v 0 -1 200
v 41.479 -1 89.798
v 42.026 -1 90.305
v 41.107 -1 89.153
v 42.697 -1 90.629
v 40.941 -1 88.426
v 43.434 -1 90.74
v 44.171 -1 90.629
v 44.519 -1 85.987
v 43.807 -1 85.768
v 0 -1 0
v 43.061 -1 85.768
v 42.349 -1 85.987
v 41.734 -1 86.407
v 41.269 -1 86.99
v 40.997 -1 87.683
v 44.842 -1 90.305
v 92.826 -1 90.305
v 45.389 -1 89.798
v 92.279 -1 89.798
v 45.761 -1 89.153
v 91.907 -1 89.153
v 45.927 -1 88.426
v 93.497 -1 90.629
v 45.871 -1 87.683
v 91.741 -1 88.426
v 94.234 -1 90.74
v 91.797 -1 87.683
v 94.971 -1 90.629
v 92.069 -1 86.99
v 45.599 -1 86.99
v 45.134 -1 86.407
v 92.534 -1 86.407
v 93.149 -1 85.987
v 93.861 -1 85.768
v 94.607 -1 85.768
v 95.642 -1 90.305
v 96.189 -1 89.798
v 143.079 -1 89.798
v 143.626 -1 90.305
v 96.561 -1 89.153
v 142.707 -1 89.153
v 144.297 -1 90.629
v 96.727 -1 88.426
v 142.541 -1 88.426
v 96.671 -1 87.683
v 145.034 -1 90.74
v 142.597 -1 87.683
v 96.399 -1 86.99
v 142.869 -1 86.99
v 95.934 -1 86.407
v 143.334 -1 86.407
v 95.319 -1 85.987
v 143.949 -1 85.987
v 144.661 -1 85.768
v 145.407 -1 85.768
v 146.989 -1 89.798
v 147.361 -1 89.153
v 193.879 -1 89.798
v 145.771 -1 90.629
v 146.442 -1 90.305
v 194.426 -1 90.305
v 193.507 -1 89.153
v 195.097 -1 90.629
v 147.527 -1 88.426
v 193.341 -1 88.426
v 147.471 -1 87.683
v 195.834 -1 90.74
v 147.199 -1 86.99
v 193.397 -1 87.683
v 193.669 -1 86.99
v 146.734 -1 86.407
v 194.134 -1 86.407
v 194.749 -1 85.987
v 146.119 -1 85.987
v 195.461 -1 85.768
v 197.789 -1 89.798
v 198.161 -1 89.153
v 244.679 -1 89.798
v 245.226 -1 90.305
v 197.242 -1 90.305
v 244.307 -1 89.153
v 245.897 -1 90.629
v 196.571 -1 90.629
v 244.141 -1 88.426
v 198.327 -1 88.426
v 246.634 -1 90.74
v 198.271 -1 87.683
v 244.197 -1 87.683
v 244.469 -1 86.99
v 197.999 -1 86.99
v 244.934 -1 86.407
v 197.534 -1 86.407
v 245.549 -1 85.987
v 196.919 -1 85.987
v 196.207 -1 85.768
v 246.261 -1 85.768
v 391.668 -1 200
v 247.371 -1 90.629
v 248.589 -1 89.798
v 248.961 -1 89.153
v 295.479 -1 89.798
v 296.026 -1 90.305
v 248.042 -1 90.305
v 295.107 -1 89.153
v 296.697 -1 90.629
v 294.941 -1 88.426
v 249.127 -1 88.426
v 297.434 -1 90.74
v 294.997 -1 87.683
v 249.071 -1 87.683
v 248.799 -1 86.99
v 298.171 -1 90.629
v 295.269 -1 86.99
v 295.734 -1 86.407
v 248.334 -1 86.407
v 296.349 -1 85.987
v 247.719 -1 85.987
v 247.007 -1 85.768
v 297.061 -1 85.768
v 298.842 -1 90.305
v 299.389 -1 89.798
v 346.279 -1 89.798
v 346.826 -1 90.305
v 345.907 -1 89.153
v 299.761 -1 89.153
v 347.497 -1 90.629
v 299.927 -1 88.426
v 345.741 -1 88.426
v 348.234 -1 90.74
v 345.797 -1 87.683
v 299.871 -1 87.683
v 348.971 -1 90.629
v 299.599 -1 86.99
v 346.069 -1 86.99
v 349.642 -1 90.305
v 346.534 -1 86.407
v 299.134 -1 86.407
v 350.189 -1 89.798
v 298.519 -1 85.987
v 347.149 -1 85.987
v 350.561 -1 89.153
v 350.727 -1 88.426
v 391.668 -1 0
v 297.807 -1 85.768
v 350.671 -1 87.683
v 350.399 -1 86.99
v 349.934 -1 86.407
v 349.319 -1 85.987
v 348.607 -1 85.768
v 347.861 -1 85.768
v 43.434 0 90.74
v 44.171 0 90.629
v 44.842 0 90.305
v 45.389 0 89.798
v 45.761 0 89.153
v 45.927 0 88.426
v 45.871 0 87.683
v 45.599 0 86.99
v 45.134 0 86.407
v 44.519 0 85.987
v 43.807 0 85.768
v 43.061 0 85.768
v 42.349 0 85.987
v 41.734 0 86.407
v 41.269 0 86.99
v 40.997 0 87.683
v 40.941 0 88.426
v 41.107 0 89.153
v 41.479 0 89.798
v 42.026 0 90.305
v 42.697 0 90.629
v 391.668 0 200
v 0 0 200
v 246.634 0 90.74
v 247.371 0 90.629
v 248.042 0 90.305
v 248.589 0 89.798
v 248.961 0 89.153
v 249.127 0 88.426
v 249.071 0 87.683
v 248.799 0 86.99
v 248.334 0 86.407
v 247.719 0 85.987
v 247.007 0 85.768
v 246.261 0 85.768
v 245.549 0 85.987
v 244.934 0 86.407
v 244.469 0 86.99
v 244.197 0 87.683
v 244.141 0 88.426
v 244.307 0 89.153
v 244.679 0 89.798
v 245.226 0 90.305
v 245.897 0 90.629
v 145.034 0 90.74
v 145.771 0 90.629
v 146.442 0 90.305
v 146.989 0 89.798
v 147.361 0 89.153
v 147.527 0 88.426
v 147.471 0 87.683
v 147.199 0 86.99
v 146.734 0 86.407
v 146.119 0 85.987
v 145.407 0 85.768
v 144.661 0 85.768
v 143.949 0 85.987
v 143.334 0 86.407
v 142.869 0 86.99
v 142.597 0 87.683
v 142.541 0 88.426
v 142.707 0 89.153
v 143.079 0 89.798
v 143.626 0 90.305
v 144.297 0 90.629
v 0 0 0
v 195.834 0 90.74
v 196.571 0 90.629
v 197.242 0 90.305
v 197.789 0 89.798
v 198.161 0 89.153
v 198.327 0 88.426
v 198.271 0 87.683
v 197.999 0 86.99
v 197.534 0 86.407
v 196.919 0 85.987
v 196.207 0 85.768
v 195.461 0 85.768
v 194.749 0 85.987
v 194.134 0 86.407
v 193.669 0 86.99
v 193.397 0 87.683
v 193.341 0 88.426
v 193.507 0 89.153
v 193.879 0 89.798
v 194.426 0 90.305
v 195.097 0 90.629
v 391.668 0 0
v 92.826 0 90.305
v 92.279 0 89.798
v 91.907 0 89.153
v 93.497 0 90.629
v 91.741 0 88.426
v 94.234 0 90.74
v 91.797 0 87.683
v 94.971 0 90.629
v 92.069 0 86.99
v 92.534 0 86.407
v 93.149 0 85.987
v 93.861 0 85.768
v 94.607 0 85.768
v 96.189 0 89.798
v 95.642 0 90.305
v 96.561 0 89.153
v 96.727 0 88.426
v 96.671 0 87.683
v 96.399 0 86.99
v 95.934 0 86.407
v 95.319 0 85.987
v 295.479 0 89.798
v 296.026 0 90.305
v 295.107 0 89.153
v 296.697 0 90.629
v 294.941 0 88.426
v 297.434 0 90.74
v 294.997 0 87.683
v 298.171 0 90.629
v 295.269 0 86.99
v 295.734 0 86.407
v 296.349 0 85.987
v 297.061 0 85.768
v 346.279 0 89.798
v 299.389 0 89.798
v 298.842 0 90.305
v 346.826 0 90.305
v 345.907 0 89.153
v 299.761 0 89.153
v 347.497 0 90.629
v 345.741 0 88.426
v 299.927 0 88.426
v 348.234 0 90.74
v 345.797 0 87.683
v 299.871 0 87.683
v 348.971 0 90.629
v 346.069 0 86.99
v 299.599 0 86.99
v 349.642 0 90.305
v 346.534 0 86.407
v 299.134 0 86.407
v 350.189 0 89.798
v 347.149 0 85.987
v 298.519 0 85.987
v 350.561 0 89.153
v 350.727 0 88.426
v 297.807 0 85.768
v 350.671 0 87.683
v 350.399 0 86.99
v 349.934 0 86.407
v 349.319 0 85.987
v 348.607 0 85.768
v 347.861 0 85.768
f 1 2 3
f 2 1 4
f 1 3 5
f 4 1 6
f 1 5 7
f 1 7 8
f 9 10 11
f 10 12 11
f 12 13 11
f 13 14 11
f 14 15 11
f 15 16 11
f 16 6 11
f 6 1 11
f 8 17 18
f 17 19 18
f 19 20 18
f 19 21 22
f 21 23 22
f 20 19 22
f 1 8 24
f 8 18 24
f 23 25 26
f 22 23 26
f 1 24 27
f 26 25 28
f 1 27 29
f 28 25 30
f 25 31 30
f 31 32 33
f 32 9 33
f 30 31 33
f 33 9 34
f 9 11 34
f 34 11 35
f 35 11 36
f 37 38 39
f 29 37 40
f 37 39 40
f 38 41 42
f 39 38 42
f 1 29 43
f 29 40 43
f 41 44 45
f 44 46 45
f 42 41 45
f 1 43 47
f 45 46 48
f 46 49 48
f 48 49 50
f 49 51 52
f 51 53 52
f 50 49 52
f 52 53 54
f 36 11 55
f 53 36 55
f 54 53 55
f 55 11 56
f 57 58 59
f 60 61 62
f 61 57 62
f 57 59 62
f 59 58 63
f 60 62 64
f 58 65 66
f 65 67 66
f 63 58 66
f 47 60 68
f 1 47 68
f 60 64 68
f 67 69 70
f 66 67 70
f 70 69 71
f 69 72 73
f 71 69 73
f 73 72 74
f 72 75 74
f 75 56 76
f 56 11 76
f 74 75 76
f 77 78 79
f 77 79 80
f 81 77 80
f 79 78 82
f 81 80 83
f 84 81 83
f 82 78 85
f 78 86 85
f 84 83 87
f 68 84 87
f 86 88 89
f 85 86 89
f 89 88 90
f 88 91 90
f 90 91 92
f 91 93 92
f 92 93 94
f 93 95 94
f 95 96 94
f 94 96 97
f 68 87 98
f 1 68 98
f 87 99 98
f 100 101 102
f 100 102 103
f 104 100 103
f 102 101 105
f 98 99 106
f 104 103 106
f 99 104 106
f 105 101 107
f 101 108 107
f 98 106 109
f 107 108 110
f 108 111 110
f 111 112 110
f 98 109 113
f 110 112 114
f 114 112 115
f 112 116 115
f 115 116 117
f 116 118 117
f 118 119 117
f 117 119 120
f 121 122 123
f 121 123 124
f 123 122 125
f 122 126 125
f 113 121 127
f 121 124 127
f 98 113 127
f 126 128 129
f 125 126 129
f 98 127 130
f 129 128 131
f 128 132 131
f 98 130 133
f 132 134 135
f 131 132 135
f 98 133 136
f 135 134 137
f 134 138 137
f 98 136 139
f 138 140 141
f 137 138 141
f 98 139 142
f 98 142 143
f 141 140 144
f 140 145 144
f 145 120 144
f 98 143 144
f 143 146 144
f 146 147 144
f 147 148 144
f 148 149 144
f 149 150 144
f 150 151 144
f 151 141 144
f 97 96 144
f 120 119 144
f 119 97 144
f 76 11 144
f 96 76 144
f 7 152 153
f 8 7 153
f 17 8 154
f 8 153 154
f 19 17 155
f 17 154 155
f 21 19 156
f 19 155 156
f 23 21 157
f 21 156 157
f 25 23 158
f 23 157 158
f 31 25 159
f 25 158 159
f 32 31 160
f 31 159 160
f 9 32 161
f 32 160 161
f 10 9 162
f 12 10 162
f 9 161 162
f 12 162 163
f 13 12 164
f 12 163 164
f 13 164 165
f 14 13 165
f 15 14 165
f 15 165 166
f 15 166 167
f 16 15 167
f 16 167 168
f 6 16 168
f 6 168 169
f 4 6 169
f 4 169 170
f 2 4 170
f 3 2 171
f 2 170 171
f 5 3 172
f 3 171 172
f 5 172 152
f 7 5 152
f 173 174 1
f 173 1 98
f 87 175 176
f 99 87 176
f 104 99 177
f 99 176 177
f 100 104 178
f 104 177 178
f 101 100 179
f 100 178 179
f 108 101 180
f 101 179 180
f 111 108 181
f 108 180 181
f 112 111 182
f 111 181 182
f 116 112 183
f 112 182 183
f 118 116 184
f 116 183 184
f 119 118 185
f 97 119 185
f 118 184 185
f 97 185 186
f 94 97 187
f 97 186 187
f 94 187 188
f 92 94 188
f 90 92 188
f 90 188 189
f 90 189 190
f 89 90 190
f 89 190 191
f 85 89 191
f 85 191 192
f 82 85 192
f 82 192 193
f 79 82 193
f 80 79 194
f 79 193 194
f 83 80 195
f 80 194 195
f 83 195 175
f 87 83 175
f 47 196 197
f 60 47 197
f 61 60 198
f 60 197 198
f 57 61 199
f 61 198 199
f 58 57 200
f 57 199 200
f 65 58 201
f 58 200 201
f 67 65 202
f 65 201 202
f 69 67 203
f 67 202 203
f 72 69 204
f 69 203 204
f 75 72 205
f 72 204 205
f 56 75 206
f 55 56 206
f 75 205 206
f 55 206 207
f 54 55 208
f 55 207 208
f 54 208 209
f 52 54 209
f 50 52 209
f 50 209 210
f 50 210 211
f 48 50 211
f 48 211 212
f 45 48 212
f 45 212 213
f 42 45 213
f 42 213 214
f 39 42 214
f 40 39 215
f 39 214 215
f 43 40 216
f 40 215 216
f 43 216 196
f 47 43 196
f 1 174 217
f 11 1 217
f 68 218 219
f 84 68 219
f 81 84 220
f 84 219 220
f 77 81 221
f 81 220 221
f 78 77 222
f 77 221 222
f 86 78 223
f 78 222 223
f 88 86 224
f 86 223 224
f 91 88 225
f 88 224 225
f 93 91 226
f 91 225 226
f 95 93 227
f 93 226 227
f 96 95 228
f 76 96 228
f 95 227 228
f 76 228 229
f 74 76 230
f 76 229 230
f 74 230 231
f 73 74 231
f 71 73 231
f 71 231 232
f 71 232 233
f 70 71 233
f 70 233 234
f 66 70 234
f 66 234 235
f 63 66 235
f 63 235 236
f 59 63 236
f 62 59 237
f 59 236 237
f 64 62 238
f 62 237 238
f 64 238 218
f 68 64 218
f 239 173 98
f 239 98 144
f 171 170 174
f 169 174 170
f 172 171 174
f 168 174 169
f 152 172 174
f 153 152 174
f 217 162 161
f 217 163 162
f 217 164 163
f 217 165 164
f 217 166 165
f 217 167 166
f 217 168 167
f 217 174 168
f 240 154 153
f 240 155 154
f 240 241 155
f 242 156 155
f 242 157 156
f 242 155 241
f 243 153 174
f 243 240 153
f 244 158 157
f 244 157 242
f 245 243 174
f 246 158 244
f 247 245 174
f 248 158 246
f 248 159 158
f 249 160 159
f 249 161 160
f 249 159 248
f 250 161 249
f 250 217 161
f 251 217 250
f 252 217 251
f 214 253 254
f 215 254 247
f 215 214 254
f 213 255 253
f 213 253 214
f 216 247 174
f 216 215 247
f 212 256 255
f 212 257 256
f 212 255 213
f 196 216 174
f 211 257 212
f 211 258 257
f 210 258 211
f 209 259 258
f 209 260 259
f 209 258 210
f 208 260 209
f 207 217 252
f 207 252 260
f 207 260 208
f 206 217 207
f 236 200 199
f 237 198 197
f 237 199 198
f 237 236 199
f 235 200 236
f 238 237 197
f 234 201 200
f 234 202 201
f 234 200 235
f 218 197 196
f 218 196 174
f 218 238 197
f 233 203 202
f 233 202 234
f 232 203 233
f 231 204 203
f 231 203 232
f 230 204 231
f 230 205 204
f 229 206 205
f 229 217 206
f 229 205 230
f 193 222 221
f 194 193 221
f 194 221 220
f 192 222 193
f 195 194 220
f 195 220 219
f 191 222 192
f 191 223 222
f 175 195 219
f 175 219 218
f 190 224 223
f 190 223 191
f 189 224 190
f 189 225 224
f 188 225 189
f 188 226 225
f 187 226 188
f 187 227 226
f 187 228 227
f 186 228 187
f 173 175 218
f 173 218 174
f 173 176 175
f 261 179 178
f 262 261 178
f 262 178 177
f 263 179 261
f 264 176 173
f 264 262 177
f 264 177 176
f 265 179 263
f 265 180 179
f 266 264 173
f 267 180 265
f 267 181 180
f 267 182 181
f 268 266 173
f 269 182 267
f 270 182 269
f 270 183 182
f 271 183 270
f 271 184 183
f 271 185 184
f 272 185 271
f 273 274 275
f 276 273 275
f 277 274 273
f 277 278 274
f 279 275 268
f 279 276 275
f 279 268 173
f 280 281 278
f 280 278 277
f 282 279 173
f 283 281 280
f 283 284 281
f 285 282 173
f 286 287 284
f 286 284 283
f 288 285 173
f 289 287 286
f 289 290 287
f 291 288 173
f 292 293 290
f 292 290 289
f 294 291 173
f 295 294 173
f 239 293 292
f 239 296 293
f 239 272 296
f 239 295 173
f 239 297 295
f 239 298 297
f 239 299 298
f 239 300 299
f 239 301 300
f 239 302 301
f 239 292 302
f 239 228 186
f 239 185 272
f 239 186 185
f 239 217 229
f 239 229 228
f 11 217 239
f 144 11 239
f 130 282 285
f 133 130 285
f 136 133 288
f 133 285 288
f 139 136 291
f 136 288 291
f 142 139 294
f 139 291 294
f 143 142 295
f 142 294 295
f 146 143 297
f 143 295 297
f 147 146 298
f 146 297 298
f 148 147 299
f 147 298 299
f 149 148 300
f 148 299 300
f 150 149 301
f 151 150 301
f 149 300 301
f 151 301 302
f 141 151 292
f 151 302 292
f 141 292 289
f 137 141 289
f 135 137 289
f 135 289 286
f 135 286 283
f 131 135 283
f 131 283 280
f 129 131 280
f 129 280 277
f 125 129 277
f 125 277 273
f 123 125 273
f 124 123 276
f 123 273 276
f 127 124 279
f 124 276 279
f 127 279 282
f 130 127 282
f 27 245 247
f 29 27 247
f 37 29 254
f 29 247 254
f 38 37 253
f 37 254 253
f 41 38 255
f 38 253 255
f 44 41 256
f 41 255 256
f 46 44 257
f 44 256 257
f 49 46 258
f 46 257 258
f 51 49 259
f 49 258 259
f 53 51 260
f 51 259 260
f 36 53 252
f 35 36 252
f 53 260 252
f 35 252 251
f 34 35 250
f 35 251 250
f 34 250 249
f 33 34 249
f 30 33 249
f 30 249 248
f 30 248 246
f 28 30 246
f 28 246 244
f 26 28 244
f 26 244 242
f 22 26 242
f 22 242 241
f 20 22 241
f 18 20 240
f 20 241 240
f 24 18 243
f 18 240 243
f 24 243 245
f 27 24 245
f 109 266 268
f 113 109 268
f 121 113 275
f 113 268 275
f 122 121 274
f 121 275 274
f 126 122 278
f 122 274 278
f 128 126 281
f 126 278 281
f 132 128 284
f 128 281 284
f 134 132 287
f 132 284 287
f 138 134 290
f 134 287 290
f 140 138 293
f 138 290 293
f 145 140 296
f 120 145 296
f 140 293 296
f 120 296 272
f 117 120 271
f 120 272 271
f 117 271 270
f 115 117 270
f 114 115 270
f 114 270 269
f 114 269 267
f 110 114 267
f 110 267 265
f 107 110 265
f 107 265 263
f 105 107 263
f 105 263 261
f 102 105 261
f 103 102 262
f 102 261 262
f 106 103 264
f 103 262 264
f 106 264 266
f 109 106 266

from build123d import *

# Parameters (mm, degrees)
SKETCH1_W           = 391.668
SKETCH1_H           = 199.9996
SKETCH1_R           = 2.5
BOSS_EXTRUDE1_DEPTH = 1


with BuildPart() as part:
    # Sketch1 → Boss-Extrude1 (new body)
    with BuildSketch(Plane(origin=(0, 0, 0), x_dir=(1, 0, 0), z_dir=(0, 1, 0))):
        with Locations((195.834, -99.9998)):
            Rectangle(SKETCH1_W, SKETCH1_H)
        with Locations(Location((348.234, -88.2396, 0), (0, 0, 270))):
            Circle(SKETCH1_R, mode=Mode.SUBTRACT)
        with Locations(Location((297.434, -88.2396, 0), (0, 0, 270))):
            Circle(SKETCH1_R, mode=Mode.SUBTRACT)
        with Locations(Location((246.634, -88.2396, 0), (0, 0, 270))):
            Circle(SKETCH1_R, mode=Mode.SUBTRACT)
        with Locations(Location((43.434, -88.2396, 0), (0, 0, 270))):
            Circle(SKETCH1_R, mode=Mode.SUBTRACT)
        with Locations(Location((94.234, -88.2396, 0), (0, 0, 270))):
            Circle(SKETCH1_R, mode=Mode.SUBTRACT)
        with Locations(Location((145.034, -88.2396, 0), (0, 0, 270))):
            Circle(SKETCH1_R, mode=Mode.SUBTRACT)
        with Locations(Location((195.834, -88.2396, 0), (0, 0, 270))):
            Circle(SKETCH1_R, mode=Mode.SUBTRACT)
    extrude(amount=-BOSS_EXTRUDE1_DEPTH)


solid = part.part
